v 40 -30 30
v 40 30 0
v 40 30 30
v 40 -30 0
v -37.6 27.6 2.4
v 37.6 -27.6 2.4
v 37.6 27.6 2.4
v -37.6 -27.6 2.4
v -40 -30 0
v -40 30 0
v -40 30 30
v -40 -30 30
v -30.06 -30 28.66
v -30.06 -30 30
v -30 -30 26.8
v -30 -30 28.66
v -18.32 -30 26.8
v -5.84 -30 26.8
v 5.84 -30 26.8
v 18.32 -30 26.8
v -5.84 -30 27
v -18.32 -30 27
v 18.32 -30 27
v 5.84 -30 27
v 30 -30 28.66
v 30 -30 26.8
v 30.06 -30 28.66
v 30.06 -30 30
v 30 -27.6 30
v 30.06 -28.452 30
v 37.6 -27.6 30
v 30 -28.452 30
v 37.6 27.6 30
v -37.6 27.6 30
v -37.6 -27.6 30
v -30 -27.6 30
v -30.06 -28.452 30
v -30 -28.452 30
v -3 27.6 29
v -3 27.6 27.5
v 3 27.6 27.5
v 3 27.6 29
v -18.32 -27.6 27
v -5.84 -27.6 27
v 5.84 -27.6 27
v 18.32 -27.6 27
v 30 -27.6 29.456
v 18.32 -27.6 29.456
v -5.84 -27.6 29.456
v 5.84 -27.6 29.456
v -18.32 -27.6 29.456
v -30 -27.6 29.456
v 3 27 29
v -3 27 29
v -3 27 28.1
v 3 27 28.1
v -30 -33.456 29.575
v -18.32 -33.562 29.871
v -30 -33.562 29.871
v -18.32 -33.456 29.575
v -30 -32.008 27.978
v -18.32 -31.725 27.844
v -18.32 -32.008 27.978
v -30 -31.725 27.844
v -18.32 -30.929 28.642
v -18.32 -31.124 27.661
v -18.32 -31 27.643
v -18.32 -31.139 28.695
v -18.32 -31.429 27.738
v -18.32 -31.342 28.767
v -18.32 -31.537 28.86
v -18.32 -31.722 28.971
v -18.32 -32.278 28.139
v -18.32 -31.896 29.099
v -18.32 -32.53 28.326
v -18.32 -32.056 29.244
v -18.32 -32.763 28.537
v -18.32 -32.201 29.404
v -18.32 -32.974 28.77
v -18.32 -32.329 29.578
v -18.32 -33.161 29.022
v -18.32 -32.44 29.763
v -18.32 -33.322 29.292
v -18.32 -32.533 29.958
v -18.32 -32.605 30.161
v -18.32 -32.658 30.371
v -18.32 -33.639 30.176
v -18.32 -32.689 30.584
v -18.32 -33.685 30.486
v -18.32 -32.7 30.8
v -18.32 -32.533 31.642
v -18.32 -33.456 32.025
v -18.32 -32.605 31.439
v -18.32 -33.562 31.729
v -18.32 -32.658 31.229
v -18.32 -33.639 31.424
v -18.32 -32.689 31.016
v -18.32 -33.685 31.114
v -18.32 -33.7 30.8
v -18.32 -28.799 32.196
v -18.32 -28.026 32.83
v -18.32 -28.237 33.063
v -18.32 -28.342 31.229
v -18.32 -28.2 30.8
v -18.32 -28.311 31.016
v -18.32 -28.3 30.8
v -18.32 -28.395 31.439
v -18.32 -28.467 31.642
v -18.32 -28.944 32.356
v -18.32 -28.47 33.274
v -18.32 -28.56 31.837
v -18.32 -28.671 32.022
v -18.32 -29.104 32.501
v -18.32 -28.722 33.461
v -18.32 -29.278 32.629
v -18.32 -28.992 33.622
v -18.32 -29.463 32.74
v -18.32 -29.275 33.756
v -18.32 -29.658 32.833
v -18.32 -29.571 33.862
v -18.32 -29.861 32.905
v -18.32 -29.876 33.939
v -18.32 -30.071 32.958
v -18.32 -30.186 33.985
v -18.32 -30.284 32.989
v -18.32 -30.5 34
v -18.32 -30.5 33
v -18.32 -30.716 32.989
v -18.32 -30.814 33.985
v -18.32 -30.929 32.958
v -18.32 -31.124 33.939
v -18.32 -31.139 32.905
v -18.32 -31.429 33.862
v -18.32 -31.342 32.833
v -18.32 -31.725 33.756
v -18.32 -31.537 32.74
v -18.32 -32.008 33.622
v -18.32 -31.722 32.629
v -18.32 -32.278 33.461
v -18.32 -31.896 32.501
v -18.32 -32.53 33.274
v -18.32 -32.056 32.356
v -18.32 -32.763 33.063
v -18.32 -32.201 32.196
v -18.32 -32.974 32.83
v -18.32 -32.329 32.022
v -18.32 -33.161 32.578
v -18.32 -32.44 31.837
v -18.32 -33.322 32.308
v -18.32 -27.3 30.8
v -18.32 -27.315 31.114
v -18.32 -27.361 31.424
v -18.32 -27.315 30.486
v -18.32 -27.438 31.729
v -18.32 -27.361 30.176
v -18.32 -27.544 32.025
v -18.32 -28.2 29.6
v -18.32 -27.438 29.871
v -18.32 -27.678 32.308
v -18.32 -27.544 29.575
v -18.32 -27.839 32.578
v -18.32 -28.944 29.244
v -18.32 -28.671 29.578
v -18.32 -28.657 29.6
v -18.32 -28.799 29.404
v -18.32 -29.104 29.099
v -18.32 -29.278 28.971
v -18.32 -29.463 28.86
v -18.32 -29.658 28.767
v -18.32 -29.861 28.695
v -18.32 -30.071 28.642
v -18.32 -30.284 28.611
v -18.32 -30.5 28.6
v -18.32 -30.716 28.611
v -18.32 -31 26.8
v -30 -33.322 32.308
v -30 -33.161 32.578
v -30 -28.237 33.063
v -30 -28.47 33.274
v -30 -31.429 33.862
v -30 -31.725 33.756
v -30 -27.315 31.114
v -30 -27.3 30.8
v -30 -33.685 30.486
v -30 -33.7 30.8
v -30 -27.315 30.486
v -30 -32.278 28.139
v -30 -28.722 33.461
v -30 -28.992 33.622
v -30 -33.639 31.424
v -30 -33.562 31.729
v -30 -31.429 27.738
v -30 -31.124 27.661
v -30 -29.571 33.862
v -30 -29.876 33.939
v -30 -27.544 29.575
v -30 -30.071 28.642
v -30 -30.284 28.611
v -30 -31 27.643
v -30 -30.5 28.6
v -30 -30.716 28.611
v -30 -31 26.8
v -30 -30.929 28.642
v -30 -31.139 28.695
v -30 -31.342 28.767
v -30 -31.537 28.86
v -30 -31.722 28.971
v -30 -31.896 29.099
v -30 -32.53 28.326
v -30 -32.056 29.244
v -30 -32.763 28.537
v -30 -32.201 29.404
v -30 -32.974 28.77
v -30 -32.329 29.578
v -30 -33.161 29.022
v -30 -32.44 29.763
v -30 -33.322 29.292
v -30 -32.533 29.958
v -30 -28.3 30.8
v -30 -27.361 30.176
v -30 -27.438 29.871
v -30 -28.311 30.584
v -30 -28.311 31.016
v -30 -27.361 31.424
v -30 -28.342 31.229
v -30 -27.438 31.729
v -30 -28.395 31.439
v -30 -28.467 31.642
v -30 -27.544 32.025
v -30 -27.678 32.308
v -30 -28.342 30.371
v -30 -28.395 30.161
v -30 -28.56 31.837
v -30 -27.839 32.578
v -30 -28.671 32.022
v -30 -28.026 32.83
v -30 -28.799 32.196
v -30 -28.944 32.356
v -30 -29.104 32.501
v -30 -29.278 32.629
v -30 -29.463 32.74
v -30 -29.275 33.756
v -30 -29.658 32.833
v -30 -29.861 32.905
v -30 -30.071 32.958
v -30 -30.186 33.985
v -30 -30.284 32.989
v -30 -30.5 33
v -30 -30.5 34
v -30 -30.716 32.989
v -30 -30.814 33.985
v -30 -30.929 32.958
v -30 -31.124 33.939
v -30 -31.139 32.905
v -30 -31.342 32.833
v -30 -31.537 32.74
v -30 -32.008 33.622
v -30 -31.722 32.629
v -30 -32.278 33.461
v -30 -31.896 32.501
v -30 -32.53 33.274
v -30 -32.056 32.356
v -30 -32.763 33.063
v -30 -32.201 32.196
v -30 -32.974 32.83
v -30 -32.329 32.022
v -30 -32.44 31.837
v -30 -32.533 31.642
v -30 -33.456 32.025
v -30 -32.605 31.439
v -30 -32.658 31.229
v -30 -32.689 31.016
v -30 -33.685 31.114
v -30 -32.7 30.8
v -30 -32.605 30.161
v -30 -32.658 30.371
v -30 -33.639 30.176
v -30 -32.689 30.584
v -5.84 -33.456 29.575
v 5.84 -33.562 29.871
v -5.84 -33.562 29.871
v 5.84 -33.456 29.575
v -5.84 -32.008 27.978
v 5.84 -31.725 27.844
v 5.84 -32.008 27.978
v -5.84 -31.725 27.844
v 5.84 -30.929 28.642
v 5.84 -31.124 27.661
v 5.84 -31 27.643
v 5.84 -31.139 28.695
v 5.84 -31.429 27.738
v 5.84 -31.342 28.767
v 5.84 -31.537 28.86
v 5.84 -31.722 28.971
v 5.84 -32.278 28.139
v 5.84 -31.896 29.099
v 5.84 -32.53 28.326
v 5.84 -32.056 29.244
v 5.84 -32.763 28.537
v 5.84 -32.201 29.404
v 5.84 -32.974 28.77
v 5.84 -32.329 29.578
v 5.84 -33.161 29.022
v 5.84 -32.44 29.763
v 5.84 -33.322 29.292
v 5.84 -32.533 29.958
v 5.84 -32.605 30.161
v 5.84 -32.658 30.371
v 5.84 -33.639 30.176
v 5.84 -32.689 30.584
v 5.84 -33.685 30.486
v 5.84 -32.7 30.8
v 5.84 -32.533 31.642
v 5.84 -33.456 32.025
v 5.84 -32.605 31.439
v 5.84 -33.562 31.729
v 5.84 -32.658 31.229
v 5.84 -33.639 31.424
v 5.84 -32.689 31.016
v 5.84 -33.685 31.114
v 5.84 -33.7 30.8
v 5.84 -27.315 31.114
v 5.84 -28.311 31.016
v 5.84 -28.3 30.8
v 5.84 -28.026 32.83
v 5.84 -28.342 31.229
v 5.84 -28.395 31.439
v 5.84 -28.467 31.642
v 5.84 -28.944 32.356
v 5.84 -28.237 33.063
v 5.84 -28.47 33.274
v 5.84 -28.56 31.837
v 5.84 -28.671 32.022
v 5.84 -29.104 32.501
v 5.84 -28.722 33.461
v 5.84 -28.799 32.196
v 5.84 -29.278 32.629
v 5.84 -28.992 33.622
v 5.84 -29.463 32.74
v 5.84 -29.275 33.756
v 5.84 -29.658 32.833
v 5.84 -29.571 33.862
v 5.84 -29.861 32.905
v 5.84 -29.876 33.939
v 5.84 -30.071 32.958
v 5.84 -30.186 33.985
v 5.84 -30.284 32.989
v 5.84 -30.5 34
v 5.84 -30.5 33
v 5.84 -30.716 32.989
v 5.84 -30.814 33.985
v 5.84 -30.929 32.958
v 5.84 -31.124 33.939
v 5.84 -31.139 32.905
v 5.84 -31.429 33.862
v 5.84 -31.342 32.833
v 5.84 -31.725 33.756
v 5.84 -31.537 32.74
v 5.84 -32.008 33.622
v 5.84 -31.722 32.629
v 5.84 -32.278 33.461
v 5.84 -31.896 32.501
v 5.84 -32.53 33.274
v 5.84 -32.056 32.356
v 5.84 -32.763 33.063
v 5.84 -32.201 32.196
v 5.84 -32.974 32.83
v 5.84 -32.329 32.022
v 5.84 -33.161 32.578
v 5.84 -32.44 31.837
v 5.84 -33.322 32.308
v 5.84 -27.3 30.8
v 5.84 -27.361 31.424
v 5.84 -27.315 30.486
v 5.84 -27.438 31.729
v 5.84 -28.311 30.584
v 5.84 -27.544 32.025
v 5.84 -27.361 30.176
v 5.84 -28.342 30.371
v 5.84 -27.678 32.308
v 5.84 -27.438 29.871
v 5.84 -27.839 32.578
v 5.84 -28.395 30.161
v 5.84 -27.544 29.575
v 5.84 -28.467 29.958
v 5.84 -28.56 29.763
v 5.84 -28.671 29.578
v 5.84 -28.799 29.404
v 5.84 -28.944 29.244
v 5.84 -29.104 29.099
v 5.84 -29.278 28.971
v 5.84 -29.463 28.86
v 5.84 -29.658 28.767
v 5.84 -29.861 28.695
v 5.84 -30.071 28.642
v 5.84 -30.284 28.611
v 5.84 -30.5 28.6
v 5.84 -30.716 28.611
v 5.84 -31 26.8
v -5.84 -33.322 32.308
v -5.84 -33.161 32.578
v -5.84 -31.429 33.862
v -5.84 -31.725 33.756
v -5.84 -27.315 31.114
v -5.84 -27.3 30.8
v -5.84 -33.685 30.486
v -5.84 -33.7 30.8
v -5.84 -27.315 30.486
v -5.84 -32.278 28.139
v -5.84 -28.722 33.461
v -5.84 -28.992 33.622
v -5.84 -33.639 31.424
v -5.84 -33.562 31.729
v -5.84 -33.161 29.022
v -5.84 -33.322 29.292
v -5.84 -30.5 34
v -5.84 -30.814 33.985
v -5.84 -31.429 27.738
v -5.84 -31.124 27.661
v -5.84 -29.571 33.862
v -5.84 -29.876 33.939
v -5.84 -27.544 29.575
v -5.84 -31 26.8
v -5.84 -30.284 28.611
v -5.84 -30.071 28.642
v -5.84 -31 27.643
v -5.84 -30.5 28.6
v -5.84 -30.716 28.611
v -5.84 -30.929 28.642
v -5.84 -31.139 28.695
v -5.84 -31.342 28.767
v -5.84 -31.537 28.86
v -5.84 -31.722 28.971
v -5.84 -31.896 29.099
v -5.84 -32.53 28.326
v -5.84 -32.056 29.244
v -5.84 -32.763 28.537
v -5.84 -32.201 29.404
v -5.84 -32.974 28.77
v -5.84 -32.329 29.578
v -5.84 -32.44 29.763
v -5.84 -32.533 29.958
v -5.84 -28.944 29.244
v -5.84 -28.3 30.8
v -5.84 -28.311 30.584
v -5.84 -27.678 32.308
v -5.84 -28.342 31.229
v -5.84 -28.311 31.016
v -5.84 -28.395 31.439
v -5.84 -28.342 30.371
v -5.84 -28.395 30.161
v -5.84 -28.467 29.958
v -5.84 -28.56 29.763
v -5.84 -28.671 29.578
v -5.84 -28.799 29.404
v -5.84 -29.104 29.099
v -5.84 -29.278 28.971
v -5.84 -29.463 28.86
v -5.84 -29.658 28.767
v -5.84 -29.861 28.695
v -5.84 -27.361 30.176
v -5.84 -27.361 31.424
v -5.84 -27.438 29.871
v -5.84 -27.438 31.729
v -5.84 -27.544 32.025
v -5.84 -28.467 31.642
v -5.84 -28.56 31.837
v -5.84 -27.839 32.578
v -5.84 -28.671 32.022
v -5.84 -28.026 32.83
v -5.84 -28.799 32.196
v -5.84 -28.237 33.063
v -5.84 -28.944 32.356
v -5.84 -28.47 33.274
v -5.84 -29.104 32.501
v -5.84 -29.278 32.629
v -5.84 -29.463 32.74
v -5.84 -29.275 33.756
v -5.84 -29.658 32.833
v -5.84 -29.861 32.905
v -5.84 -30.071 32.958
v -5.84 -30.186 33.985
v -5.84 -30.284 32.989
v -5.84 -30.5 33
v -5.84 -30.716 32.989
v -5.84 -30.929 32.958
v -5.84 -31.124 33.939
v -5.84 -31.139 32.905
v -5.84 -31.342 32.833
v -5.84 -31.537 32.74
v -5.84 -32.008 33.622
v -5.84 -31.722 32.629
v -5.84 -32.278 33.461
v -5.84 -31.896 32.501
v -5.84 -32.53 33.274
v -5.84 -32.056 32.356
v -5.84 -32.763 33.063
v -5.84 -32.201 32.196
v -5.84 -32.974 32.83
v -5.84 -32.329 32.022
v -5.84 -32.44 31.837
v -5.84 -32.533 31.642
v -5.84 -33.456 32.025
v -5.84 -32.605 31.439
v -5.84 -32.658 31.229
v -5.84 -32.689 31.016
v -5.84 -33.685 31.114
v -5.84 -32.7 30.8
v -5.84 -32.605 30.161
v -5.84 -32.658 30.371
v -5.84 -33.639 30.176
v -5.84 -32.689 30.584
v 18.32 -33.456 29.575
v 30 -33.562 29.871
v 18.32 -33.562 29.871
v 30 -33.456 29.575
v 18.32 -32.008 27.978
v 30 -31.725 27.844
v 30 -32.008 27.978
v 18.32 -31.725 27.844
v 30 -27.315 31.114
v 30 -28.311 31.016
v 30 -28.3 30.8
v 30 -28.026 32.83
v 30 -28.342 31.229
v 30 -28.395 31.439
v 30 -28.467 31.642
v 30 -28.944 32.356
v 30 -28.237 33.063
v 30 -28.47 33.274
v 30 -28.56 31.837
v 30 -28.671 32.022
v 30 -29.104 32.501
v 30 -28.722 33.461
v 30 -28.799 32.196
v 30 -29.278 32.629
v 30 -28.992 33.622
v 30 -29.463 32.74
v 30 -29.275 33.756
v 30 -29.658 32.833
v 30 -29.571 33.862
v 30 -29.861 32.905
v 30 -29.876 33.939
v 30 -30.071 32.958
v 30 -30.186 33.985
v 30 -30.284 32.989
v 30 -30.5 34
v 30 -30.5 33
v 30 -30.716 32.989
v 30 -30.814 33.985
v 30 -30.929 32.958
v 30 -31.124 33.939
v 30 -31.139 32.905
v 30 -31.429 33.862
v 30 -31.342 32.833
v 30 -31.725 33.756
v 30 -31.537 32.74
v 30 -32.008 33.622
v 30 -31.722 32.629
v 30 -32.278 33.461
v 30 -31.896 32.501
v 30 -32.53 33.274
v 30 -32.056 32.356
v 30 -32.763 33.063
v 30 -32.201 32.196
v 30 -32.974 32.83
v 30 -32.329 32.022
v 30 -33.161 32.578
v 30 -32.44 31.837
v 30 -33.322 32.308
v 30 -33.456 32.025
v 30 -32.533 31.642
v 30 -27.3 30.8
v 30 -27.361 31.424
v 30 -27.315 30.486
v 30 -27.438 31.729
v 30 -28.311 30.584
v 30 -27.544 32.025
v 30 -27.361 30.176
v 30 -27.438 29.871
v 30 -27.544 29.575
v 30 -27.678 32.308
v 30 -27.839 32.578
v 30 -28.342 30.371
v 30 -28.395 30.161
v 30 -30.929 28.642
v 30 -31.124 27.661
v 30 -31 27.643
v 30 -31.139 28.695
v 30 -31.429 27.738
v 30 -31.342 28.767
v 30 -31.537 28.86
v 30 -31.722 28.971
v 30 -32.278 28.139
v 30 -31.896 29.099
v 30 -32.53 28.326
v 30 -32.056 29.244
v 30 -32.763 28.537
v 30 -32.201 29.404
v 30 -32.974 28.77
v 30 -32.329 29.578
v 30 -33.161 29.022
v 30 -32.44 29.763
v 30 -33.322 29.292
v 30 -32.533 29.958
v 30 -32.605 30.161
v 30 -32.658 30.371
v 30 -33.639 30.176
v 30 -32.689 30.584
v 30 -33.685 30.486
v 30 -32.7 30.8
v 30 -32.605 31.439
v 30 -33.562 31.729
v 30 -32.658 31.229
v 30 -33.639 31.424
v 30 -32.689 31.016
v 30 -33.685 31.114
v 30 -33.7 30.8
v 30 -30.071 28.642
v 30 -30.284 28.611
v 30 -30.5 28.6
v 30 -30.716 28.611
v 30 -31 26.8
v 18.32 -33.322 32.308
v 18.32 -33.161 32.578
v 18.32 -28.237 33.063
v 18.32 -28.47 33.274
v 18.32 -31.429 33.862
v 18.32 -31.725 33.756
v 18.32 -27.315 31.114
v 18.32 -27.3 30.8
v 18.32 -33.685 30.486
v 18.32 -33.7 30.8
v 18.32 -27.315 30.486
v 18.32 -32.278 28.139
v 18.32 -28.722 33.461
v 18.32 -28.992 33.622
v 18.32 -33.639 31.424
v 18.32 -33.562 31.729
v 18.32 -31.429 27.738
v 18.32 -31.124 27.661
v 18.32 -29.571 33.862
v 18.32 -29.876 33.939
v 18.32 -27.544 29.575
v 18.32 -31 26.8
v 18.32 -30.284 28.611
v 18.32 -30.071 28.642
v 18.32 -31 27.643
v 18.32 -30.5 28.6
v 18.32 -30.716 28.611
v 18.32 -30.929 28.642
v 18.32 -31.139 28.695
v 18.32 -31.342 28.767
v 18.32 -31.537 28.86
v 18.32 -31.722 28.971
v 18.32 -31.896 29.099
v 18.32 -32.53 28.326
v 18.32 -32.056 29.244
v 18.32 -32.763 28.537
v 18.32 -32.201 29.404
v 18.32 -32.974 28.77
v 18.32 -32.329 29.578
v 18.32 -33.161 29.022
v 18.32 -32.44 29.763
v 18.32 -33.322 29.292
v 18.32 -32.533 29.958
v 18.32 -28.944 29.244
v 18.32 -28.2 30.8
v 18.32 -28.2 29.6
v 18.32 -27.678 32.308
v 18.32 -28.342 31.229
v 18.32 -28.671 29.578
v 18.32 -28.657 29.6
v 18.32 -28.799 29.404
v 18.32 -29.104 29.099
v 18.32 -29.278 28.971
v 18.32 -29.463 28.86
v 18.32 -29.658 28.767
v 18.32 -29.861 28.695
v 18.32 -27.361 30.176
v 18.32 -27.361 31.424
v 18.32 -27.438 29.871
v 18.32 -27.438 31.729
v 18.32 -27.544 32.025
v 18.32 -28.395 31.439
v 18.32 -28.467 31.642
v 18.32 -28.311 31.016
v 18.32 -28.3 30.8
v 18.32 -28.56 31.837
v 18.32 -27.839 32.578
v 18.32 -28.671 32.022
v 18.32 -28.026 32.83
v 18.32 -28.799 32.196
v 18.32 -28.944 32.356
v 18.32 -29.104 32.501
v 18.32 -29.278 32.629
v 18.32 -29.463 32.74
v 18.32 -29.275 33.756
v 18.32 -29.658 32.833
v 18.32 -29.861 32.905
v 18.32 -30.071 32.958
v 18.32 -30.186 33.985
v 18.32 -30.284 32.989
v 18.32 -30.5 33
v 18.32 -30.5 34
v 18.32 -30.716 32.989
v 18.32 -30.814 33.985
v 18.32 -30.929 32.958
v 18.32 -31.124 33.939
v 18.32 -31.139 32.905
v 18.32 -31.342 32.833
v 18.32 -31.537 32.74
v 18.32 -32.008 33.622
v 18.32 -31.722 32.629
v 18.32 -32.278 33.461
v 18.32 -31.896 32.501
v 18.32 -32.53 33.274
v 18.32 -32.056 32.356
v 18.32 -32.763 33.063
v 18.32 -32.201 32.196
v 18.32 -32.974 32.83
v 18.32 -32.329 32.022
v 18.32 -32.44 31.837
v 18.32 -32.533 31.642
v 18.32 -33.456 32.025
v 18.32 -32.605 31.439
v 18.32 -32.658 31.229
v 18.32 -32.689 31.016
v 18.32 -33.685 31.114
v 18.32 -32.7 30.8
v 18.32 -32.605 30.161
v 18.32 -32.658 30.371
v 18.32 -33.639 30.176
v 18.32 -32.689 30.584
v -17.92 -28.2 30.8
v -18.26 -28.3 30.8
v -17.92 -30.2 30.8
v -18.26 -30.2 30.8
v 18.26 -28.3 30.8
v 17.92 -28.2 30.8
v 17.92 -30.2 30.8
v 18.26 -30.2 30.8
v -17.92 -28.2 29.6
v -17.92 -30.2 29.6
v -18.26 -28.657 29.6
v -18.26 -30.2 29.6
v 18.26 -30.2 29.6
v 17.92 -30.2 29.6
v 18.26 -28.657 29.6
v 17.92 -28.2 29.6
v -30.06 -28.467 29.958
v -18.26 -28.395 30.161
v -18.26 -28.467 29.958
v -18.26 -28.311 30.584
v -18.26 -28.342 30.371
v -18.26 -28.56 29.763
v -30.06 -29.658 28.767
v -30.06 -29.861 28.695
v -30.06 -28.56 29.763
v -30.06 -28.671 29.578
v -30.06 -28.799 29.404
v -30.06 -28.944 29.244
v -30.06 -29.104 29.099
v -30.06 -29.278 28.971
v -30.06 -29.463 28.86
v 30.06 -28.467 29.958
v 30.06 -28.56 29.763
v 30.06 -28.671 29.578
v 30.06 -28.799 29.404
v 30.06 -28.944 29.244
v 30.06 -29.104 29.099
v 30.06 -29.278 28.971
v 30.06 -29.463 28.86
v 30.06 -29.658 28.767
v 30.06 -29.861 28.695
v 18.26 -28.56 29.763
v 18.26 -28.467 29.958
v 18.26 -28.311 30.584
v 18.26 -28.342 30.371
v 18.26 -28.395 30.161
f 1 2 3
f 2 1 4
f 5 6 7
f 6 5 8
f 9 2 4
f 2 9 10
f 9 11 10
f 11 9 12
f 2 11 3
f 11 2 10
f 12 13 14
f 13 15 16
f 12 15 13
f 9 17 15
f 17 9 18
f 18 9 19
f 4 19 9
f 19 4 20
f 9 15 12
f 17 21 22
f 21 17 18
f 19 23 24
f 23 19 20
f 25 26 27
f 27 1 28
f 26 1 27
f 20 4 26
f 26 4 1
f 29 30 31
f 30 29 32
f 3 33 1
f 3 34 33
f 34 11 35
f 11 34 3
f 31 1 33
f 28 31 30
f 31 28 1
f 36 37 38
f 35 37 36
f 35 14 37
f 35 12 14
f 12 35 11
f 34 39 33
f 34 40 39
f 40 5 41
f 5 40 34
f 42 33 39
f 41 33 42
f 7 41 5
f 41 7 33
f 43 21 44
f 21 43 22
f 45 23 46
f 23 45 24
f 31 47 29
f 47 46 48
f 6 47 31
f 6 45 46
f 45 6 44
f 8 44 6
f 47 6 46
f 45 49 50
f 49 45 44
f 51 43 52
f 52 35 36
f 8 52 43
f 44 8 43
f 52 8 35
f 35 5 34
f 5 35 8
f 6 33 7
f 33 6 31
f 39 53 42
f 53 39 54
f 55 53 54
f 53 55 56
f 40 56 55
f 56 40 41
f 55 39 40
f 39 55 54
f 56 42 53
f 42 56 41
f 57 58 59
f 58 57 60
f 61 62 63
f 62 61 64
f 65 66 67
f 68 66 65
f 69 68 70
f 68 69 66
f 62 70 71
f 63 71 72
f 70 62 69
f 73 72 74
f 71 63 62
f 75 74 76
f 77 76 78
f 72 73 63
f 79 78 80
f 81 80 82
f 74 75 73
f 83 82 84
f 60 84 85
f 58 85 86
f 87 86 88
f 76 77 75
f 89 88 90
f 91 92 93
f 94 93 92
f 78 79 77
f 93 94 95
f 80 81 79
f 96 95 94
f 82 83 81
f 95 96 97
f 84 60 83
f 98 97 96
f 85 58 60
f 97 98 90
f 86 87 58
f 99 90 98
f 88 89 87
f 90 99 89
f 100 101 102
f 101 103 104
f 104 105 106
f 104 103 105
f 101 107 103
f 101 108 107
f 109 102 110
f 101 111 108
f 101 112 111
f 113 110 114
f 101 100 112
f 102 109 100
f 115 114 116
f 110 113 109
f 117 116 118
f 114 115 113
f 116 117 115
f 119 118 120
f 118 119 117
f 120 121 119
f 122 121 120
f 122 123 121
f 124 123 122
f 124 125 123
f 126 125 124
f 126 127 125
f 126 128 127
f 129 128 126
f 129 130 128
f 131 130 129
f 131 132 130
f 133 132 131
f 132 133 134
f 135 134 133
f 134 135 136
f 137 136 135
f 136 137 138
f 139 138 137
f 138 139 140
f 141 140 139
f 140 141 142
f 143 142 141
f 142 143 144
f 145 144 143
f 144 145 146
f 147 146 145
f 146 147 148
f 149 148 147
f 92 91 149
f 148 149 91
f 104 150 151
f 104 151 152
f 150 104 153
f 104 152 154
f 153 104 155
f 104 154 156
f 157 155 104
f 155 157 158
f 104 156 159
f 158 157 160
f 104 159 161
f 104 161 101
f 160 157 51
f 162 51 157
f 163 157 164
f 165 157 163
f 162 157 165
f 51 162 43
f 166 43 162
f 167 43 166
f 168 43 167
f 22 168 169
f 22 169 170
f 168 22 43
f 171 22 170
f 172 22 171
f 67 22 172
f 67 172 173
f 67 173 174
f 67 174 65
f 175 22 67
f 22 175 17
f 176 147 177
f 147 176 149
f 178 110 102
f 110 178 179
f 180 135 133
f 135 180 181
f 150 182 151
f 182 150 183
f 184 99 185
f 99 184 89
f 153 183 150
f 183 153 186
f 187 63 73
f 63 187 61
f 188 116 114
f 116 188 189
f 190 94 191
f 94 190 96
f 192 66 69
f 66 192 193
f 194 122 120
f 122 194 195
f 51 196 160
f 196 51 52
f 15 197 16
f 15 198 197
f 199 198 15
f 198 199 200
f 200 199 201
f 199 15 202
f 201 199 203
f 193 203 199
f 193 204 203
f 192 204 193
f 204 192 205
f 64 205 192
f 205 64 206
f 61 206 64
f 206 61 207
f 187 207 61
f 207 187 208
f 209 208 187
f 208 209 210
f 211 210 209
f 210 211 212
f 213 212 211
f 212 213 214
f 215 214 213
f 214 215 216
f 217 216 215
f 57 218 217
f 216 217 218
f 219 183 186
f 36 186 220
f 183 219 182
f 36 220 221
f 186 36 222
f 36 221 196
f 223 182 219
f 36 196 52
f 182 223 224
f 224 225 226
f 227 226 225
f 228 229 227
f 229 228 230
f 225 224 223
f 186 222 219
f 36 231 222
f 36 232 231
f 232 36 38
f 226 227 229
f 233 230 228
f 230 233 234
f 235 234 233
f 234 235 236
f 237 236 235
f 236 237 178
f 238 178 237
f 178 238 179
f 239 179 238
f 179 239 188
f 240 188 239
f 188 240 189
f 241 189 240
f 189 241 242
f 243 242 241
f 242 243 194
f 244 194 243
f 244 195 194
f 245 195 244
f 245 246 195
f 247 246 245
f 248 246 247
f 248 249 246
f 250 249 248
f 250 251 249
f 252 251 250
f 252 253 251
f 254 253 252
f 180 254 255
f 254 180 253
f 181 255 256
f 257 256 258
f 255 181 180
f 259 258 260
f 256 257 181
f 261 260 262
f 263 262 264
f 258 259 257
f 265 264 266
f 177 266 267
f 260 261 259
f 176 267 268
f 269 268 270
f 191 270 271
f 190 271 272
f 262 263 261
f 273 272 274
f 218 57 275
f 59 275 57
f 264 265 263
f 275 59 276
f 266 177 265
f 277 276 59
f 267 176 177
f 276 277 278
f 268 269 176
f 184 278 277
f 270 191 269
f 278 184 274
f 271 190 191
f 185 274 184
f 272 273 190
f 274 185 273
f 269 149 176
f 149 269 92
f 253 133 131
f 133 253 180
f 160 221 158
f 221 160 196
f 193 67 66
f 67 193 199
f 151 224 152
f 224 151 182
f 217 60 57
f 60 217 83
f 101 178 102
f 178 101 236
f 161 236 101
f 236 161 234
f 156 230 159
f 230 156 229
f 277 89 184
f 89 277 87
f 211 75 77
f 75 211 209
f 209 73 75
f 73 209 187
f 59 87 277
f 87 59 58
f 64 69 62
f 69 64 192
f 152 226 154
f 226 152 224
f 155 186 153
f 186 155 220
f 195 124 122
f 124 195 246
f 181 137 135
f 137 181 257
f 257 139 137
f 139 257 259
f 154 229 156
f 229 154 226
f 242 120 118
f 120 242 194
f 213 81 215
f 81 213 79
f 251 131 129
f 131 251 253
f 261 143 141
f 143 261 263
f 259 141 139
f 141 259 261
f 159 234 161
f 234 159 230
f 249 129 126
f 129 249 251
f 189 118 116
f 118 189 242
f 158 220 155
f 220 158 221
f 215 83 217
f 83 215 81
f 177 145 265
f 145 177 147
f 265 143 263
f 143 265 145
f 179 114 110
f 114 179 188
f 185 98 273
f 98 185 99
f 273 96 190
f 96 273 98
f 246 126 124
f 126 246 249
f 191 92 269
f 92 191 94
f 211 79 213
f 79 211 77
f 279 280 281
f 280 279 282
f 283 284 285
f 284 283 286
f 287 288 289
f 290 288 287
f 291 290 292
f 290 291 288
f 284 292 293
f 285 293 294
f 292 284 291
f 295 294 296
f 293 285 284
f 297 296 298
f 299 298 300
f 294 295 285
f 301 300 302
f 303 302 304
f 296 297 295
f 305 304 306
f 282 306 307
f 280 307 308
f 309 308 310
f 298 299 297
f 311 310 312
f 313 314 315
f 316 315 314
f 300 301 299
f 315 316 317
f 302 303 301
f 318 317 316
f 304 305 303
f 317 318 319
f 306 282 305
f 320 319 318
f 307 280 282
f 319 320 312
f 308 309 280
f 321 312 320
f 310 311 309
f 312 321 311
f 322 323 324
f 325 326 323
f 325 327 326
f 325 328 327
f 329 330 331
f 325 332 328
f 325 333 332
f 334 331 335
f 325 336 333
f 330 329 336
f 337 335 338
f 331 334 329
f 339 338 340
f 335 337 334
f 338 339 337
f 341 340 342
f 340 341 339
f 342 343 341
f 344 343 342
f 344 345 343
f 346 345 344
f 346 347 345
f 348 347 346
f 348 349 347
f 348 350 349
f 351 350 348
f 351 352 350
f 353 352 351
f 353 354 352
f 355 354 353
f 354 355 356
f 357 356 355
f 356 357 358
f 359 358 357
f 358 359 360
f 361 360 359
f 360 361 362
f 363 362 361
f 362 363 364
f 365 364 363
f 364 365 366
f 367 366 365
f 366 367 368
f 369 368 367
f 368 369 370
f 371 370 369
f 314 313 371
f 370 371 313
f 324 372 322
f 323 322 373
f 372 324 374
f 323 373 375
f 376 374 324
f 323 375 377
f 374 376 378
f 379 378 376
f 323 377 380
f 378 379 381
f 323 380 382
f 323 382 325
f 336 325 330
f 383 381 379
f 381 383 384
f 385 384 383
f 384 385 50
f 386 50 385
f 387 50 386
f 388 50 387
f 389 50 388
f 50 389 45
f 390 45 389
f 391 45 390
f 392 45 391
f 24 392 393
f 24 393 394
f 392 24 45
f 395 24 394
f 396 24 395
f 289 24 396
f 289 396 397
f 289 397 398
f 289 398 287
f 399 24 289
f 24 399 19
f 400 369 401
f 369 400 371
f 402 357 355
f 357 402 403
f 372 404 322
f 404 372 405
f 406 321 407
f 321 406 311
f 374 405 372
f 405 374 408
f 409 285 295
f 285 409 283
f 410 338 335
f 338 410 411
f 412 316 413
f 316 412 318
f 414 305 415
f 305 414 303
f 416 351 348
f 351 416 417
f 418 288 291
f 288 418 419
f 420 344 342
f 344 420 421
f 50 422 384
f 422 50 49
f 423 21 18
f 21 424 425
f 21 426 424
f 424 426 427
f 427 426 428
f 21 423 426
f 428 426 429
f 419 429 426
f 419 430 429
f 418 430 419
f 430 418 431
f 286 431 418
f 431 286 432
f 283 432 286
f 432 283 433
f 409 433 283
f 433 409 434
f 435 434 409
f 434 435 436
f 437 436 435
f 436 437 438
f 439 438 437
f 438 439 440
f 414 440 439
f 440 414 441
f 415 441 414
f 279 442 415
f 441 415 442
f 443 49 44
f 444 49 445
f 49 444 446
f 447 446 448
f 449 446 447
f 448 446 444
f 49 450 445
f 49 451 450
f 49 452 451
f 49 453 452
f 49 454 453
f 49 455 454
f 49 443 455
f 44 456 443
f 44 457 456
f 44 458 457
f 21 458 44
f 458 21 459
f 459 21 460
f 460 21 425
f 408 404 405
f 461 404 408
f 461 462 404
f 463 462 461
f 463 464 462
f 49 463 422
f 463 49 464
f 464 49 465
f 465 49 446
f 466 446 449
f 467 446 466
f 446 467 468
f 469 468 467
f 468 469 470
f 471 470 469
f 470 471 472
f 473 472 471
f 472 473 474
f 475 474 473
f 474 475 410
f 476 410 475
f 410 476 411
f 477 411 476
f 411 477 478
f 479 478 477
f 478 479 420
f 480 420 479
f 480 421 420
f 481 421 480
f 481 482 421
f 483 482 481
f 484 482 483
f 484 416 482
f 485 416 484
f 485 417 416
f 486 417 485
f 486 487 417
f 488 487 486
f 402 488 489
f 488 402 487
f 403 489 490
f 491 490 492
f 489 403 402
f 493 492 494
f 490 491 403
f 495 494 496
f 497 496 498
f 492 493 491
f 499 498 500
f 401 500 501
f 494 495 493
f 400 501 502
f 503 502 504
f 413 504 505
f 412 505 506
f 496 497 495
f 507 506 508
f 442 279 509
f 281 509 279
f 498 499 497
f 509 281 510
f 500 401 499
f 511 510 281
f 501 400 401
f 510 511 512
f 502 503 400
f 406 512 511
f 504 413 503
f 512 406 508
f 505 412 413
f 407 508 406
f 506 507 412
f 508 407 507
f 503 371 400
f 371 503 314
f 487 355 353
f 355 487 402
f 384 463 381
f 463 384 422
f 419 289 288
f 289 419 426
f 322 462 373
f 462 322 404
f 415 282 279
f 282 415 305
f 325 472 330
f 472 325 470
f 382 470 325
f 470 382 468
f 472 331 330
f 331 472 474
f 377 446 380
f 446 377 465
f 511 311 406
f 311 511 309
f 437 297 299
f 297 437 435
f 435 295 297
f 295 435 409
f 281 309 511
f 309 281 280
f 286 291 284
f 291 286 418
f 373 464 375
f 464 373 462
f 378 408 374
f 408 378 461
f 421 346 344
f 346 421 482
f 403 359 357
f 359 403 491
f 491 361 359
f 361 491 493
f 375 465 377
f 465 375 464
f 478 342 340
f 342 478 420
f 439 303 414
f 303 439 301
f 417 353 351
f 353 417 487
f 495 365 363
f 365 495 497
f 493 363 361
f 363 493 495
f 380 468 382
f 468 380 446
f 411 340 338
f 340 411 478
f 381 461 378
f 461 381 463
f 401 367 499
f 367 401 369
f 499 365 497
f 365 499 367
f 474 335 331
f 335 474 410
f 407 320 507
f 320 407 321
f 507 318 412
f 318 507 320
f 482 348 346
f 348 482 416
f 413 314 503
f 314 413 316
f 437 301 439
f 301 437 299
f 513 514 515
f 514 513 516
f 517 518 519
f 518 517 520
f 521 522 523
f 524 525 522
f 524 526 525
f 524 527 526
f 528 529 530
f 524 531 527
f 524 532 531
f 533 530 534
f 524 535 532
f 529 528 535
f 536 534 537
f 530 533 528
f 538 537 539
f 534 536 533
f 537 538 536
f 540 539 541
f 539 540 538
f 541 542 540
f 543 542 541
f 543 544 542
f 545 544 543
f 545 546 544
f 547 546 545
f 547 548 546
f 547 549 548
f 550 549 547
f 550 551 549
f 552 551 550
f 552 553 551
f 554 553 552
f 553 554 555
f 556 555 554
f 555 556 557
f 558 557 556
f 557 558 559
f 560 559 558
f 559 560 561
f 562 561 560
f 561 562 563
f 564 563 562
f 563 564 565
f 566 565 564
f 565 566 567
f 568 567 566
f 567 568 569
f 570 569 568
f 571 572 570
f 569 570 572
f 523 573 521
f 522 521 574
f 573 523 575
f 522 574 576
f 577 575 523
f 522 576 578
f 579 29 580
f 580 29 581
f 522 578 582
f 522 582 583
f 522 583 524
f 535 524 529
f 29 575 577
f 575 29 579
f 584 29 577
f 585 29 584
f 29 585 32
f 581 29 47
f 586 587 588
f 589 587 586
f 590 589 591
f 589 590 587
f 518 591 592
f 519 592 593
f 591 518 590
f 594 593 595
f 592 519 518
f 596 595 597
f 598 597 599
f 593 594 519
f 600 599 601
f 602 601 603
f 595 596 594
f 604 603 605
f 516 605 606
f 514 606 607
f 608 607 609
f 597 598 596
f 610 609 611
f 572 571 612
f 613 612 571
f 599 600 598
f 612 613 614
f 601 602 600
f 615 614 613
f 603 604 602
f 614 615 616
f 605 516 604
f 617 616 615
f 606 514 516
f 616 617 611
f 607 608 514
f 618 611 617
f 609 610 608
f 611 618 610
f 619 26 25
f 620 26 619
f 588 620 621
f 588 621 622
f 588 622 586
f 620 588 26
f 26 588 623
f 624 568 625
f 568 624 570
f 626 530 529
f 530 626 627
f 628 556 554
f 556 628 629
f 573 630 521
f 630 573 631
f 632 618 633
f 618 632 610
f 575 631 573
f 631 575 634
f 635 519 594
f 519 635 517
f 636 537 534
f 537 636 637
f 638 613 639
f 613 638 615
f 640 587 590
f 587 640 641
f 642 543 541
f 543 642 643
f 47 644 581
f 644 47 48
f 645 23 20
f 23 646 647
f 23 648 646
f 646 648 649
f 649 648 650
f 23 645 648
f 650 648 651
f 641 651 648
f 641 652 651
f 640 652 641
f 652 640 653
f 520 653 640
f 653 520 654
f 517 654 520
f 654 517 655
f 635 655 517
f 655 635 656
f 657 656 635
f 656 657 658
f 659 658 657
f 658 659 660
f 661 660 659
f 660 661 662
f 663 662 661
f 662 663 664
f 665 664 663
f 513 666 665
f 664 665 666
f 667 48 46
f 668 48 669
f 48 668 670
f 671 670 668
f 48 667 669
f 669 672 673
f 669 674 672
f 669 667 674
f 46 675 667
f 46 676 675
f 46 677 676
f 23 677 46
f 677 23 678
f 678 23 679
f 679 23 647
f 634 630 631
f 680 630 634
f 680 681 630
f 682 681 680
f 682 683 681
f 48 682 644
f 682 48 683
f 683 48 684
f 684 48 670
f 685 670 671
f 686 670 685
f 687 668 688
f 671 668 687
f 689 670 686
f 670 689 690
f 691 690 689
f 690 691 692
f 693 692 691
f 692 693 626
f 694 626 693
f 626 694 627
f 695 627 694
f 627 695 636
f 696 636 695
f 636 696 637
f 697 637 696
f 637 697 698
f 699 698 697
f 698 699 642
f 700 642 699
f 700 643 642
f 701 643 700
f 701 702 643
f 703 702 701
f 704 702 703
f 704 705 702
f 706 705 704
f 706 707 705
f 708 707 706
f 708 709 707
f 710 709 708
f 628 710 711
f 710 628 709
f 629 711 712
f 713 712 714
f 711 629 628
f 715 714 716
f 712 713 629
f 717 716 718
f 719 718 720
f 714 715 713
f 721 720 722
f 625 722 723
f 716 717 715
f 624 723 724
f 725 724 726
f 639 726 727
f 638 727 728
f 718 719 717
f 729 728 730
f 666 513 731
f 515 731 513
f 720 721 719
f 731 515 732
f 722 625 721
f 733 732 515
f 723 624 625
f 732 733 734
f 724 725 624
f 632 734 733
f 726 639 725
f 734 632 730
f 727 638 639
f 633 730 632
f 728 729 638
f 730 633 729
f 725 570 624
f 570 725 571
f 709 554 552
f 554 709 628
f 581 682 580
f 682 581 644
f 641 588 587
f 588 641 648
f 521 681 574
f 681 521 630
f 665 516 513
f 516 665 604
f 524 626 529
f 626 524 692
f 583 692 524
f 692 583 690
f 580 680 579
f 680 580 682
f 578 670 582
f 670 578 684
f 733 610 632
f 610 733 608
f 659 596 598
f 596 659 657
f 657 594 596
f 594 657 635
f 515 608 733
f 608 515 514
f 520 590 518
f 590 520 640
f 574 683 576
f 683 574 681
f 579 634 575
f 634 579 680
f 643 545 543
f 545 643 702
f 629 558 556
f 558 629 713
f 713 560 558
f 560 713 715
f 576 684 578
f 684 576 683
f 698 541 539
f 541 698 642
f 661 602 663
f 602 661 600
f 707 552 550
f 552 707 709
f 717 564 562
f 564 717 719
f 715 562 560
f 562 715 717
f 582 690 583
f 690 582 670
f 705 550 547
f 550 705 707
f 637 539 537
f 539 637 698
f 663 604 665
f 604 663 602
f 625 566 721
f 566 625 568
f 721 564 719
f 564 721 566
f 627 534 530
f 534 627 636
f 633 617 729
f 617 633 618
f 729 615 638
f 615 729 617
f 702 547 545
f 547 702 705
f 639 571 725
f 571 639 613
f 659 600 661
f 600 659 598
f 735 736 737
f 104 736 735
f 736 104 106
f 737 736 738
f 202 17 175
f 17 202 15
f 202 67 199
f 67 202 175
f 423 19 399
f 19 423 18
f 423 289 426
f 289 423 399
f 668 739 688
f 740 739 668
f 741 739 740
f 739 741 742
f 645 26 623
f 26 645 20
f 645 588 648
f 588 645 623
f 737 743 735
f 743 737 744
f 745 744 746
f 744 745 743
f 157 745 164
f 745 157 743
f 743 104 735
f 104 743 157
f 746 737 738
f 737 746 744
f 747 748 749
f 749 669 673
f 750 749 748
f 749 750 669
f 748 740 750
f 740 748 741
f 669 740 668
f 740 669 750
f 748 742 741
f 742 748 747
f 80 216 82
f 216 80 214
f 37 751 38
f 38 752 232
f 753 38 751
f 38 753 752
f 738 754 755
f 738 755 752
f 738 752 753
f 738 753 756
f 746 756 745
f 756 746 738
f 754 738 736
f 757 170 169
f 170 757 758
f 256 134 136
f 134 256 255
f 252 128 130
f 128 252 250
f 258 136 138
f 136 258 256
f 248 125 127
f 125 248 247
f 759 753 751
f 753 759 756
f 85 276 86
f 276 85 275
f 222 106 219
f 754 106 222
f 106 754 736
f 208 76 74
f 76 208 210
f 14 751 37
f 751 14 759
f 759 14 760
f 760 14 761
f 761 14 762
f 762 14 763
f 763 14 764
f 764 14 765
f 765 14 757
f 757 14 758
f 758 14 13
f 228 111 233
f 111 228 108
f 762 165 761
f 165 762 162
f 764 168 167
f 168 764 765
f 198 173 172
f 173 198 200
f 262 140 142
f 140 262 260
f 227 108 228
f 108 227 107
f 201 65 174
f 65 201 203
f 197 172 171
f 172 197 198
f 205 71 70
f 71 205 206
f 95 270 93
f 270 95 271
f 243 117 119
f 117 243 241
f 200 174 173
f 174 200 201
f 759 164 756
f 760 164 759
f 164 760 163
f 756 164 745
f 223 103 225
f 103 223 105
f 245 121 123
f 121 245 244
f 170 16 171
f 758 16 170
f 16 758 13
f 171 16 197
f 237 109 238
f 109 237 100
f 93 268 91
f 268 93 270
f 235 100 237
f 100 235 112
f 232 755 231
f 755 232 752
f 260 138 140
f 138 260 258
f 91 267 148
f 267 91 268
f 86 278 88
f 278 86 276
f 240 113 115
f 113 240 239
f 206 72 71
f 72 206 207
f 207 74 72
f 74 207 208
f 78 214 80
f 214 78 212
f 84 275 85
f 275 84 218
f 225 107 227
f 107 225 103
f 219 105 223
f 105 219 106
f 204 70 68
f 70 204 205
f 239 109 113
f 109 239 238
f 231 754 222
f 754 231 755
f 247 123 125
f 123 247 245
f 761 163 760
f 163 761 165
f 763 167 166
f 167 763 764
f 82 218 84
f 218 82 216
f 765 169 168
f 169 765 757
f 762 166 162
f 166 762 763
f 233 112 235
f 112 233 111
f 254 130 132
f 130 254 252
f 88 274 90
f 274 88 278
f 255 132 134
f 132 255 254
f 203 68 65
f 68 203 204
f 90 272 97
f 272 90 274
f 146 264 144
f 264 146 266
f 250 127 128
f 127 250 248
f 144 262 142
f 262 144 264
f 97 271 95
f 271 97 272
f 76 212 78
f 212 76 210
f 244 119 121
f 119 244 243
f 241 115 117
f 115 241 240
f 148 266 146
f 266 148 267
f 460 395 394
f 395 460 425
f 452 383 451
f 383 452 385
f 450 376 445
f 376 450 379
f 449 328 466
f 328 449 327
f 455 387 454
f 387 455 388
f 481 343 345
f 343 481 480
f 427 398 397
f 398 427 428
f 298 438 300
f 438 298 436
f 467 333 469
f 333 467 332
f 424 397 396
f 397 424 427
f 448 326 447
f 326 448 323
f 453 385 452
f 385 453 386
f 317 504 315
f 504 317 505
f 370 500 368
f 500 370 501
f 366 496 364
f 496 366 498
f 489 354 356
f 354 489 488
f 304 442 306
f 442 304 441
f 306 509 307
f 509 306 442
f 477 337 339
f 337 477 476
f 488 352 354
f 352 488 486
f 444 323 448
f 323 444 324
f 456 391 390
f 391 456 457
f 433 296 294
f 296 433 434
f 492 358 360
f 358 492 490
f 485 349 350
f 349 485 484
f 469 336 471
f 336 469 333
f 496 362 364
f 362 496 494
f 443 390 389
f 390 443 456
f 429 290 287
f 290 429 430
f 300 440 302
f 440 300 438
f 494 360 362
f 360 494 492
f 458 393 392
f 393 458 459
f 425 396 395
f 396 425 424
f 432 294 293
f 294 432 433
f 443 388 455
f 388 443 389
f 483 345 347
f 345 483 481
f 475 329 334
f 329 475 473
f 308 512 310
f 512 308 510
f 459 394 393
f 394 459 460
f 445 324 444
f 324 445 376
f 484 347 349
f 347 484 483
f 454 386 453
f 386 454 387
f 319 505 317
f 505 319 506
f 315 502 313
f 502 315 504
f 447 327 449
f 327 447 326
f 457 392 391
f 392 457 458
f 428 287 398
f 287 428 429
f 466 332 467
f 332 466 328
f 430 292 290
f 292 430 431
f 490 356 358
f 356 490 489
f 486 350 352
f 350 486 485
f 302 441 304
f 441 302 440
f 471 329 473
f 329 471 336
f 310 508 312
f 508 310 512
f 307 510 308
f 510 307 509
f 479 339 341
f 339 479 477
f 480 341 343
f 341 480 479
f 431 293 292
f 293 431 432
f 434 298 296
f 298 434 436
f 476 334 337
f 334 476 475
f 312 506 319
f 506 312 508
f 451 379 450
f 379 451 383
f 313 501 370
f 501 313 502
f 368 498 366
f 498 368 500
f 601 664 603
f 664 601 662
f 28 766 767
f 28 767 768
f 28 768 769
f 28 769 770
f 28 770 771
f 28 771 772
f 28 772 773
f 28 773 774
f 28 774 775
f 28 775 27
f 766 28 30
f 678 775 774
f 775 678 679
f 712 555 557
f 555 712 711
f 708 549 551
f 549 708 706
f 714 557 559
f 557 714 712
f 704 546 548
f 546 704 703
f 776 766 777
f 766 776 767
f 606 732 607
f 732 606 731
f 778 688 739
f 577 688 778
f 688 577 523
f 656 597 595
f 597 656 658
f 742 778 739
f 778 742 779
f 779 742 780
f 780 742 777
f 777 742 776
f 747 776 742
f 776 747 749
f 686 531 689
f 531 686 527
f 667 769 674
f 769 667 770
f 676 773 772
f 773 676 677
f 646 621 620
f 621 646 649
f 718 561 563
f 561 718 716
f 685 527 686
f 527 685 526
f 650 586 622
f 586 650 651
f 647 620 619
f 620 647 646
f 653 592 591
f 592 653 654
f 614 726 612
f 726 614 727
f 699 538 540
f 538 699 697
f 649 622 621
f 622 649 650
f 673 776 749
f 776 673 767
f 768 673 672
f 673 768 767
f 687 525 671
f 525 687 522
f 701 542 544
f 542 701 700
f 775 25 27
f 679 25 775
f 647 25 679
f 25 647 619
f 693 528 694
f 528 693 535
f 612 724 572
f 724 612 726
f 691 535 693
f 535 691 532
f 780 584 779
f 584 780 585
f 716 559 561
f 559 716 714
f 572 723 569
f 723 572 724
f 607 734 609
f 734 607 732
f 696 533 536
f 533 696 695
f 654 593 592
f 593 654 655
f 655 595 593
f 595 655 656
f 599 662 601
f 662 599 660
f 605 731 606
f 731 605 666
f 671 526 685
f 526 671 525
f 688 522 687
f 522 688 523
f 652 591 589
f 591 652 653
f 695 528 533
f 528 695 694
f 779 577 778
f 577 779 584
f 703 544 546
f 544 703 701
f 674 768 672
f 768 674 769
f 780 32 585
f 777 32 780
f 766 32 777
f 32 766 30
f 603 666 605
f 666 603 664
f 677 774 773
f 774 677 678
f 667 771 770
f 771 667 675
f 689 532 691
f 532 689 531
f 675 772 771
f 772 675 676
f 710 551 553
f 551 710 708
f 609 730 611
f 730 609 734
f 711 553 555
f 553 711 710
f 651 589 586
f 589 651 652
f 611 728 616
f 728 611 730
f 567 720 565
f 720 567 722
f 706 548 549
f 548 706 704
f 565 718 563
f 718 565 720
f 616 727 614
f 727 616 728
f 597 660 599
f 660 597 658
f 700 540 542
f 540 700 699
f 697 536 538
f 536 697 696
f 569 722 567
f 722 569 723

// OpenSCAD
// Box with print-in-place hinge (v4: bridge webs to kill band overhangs)
part = "box";
cadverify_only = "";
module instance(name, part, unit = 1) {
    echo(cadverify_instance = [name, part, unit]);
    if (cadverify_only == "" || cadverify_only == name) children();
}

Rkn = 3.2; rbore = 2.2; rpin = 1.9;
yh = -30.5; zh = 30.8;
lid_zh = 3.4;
lid_lift = 27.4;
pin_lift_z = 27.8; pin_shift_y = -30.5;
k0x0=-30; k0x1=-18.32;
k1x0=-17.92; k1x1=-6.24;
k2x0=-5.84; k2x1=5.84;
k3x0=6.24; k3x1=17.92;
k4x0=18.32; k4x1=30;

$fn = 64;

module xcyl(x0, x1, r, y, z) {
    translate([x0, y, z]) rotate([0, 90, 0]) cylinder(r = r, h = x1 - x0);
}

module box_part() {
    difference() {
        union() {
            translate([-40, -30, 0]) cube([80, 60, 2.4]);
            translate([-40, 27.6, 2.4]) cube([80, 2.4, 27.6]);
            translate([-40, -30, 2.4]) cube([80, 2.4, 24.6]);
            translate([-40, -30, 27.0]) cube([11, 2.4, 3.0]);
            translate([29, -30, 27.0]) cube([11, 2.4, 3.0]);
            translate([-40, -27.6, 2.4]) cube([2.4, 55.2, 27.6]);
            translate([37.6, -27.6, 2.4]) cube([2.4, 55.2, 27.6]);
            // catch bump (front inner) with 45 deg chamfered underside: no overhang
            polyhedron(
                points=[[-3,27.6,27.5],[3,27.6,27.5],
                        [-3,27.6,29.0],[3,27.6,29.0],
                        [-3,27.0,29.0],[3,27.0,29.0],
                        [-3,27.0,28.1],[3,27.0,28.1]],
                faces=[[0,2,3,1],[2,4,5,3],[4,6,7,5],[6,0,1,7],
                       [0,6,4,2],[1,3,5,7]]
            );
            // hinge knuckles + support webs tying them to the back wall
            xcyl(k0x0, k0x1, Rkn, yh, zh);
            xcyl(k2x0, k2x1, Rkn, yh, zh);
            xcyl(k4x0, k4x1, Rkn, yh, zh);
            translate([k0x0, -31, 26.8]) cube([k0x1-k0x0, 3.4, 4.0]);
            translate([k2x0, -31, 26.8]) cube([k2x1-k2x0, 3.4, 4.0]);
            translate([k4x0, -31, 26.8]) cube([k4x1-k4x0, 3.4, 4.0]);
            // two bridge webs filling wall-to-knuckle band gaps (support-free cover)
            translate([-18.32, -30.2, 29.6]) cube([0.4, 2.0, 1.2]);
            translate([17.92, -30.2, 29.6]) cube([0.4, 2.0, 1.2]);
        }
        xcyl(k0x0-0.06, k0x1+0.06, rbore, yh, zh);
        xcyl(k2x0-0.06, k2x1+0.06, rbore, yh, zh);
        xcyl(k4x0-0.06, k4x1+0.06, rbore, yh, zh);
    }
}

module lid_part() {
    difference() {
        union() {
            translate([-40, -30, 10.6]) cube([80, 60, 2.4]);
            translate([-40, 27.6, 3]) cube([80, 2.4, 7.6]);
            translate([k1x0, -30, 3]) cube([k1x1-k1x0, 2.4, 7.6]);
            translate([k3x0, -30, 3]) cube([k3x1-k3x0, 2.4, 7.6]);
            translate([-40, -30, 3]) cube([11, 2.4, 7.6]);
            translate([29, -30, 3]) cube([11, 2.4, 7.6]);
            translate([-40, -27.6, 3]) cube([2.4, 55.2, 7.6]);
            translate([37.6, -27.6, 3]) cube([2.4, 55.2, 7.6]);
            translate([-37.2, 25.2, 0]) cube([74.4, 2.0, 10.6]);
            translate([-37.2, -27.2, 0]) cube([74.4, 2.0, 10.6]);
            translate([-37.2, -25.2, 0]) cube([2.0, 50.4, 10.6]);
            translate([35.2, -25.2, 0]) cube([2.0, 50.4, 10.6]);
            xcyl(k1x0, k1x1, Rkn, yh, lid_zh);
            xcyl(k3x0, k3x1, Rkn, yh, lid_zh);
            translate([k1x0, -31, 0]) cube([k1x1-k1x0, 3.4, 5]);
            translate([k3x0, -31, 0]) cube([k3x1-k3x0, 3.4, 5]);
            // filler webs closing lid-knuckle band overlap with box lugs
            translate([-6.24, -30.2, 0]) cube([0.4, 2.0, 1.2]);
            translate([5.84, -30.2, 0]) cube([0.4, 2.0, 1.2]);
        }
        xcyl(k1x0-0.06, k1x1+0.06, rbore, yh, lid_zh);
        xcyl(k3x0-0.06, k3x1+0.06, rbore, yh, lid_zh);
        translate([-3.3, 26.3, -0.05]) cube([6.6, 1.5, 2.05]);
    }
}

module pin_part() {
    union() {
        xcyl(-32.4, 32.4, rpin, 0, 3);
        xcyl(30.4, 32.4, 3, 0, 3);
        xcyl(-32.4, -30.4, 3, 0, 3);
    }
}

if (part == "box") {
    echo(cadverify_spec = [
        ["bounds", [[-40, -33.7, 0], [40, 30, 34.0]]],
        ["bodies", 1],
        ["through_holes", 3],
        ["support_faces", [["bed", "-z", 4000]]],
        ["overhangs_allowed", [["hinge knuckles, bores and wall cutouts print in place", [[-30.2, -33.9, 26.5], [30.2, -27.1, 33.5]]]]],
        ["copies", 1],
        ["details", [
            ["floor", "thickness", [0, 0, -1], [0, 0, 1], 2.4],
            ["front_wall", "thickness", [0, 31, 15], [0, -1, 0], 2.4],
            ["cavity", "void", [[-37.6, -27.6, 2.4], [37.6, 27.6, 29.9]], 0.9],
            ["hinge_bore", "hole", [-31, -30.5, 30.8], [1, 0, 0], [[0, 4.4], [11.6, 4.4]]],
            ["catch_bump", "material", [[-3, 27.0, 27.5], [3, 27.6, 29.0]], 0.9],
            ["hinge_view", "view", [[-30, -34, 26.5], [30, -27, 34.5]]]
        ]]
    ]);
    box_part();
} else if (part == "lid") {
    echo(cadverify_spec = [
        ["bounds", [[-40, -33.7, 0], [40, 30, 13]]],
        ["bodies", 1],
        ["through_holes", 2],
        ["support_faces", [["bed", "-z", 300]]],
        ["overhangs_allowed", [
            ["hinge knuckles and bores print in place", [[-18.2, -33.9, 0], [18.2, -27.1, 4.2]]],
            ["lid top bridging over plug cavity", [[-37.2, -24.9, 10.1], [37.2, 25.2, 11.1]]]
        ]],
        ["copies", 1],
        ["details", [
            ["top", "thickness", [0, 0, 14], [0, 0, -1], 2.4],
            ["skirt", "thickness", [0, 31, 6], [0, -1, 0], 2.4],
            ["plug_cavity", "void", [[-35.2, -24.9, 0], [35.2, 25.2, 10.5]], 0.9],
            ["hinge_bore", "hole", [-18.6, -30.5, 3.4], [1, 0, 0], [[0, 4.4], [11.6, 4.4]]],
            ["catch_notch", "void", [[-3.3, 26.3, 0], [3.3, 27.8, 2.0]], 0.9],
            ["catch_view", "view", [[-5, 26, 0], [5, 28.5, 3]]]
        ]]
    ]);
    lid_part();
} else if (part == "pin") {
    echo(cadverify_spec = [
        ["bounds", [[-32.4, -3, 0], [32.4, 3, 6]]],
        ["bodies", 1],
        ["support_faces", []],
        ["overhangs_allowed", [["pin shaft underside bridges with 0.3 gap", [[-32.4, -1.9, 0], [32.4, 1.9, 1.6]]]]],
        ["copies", 1],
        ["details", [
            ["shaft", "thickness", [0, 3, 3], [0, -1, 0], 3.8],
            ["head", "material", [[30.4, -3, 0], [32.4, 3, 6]], 0.7],
            ["pin_view", "view", [[-32.4, -3, 0], [32.4, 3, 6]]]
        ]]
    ]);
    pin_part();
} else if (part == "assembly") {
    echo(cadverify_spec = [
        ["bounds", [[-40, -33.7, 0], [40, 30, 40.4]]],
        ["support_faces", [["bed", "-z", 4000]]],
        ["allowed_interferences", []],
        ["motions", [
            ["lid_open", ["lid"], "rotate", [0, -30.5, 30.8], [1, 0, 0], [0, 110], ["flex", [["lid", "box", 0.5, "catch bump clearance pass"]]]]
        ]],
        ["assembly_order", [
            [["box"], [0, 0, 0]],
            [["lid"], [0, 0, -1]],
            [["pin"], [1, 0, 0]]
        ]],
        ["print_in_place", 0.3],
        ["overhangs_allowed", [
            ["hinge undersides, pin bridge and cutouts in place", [[-33, -34, 26.5], [33, -27, 34.8]]],
            ["lid top bridging over box cavity", [[-37.2, -24.9, 37.5], [37.2, 25.2, 38.5]]]
        ]]
    ]);
    instance("box", "box") box_part();
    instance("lid", "lid") translate([0, 0, lid_lift]) lid_part();
    instance("pin", "pin") translate([0, pin_shift_y, pin_lift_z]) pin_part();
}
